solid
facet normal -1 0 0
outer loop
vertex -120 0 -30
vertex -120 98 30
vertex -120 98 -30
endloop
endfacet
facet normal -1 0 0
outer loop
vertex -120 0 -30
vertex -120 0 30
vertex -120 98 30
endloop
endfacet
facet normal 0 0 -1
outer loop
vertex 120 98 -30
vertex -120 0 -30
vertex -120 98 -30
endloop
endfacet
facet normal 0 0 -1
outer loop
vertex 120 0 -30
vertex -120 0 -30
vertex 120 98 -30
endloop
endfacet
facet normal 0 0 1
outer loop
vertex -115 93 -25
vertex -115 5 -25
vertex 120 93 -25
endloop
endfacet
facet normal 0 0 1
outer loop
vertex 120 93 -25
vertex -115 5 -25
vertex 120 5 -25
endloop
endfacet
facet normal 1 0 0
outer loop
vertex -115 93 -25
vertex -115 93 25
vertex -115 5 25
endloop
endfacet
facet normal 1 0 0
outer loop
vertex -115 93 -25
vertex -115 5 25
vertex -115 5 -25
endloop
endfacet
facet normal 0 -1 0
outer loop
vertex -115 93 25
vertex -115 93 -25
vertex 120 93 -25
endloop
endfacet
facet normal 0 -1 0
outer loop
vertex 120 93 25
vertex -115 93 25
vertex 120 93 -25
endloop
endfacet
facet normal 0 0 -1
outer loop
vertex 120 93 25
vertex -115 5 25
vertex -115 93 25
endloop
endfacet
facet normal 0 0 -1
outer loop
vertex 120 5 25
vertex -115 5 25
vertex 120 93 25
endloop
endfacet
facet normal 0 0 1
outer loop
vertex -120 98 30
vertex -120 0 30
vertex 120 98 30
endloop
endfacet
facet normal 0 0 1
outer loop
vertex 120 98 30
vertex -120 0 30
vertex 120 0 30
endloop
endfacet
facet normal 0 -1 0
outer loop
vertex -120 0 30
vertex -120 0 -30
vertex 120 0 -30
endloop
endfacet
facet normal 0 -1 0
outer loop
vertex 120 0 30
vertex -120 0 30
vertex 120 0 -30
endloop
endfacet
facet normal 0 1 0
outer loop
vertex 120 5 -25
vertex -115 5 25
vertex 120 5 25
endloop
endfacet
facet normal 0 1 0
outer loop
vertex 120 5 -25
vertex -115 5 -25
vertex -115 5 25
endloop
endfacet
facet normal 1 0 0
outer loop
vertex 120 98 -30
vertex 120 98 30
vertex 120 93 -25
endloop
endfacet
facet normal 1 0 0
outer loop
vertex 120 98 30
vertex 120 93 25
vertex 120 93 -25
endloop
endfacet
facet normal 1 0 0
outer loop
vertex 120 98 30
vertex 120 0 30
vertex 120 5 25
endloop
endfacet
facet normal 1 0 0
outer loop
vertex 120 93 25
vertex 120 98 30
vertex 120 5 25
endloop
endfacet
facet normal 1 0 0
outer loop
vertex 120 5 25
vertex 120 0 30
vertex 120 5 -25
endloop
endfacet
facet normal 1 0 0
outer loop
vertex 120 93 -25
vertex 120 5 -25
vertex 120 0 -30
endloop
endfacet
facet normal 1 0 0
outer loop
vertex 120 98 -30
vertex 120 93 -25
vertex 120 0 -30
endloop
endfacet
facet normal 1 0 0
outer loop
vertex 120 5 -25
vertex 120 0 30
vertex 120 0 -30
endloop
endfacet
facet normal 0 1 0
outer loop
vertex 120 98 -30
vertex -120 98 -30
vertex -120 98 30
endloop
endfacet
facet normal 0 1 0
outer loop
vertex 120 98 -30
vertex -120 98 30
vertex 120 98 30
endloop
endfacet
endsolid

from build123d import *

# Parameters (mm, degrees)
SKETCH1_W           = 240
SKETCH1_H           = 60
BOSS_EXTRUDE1_DEPTH = 5
BOSS_EXTRUDE2_DEPTH = 88
BOSS_EXTRUDE3_START = 93
SKETCH1_2_W         = 240
SKETCH1_2_H         = 60
BOSS_EXTRUDE3_DEPTH = 5


with BuildPart() as part:
    # Sketch1 → Boss-Extrude1 (new body)
    with BuildSketch(Plane(origin=(0, 0, 0), x_dir=(1, 0, 0), z_dir=(0, 1, 0))):
        Rectangle(SKETCH1_W, SKETCH1_H)
    extrude(amount=BOSS_EXTRUDE1_DEPTH)

    # Sketch2 → Boss-Extrude2 (add)
    with BuildSketch(Plane(origin=(0, 5, 0), x_dir=(1, 0, 0), z_dir=(0, 1, 0))):
        Polygon((-120, 30), (-120, -30), (120, -30), (120, -25), (-115, -25), (-115, 25), (120, 25), (120, 30), align=None)
    extrude(amount=BOSS_EXTRUDE2_DEPTH)

    # Sketch1<2> → Boss-Extrude3 (add)
    with BuildSketch(Plane(origin=(0, 0, 0), x_dir=(1, 0, 0), z_dir=(0, 1, 0)).offset(BOSS_EXTRUDE3_START)):
        Rectangle(SKETCH1_2_W, SKETCH1_2_H)
    extrude(amount=BOSS_EXTRUDE3_DEPTH)


solid = part.part
